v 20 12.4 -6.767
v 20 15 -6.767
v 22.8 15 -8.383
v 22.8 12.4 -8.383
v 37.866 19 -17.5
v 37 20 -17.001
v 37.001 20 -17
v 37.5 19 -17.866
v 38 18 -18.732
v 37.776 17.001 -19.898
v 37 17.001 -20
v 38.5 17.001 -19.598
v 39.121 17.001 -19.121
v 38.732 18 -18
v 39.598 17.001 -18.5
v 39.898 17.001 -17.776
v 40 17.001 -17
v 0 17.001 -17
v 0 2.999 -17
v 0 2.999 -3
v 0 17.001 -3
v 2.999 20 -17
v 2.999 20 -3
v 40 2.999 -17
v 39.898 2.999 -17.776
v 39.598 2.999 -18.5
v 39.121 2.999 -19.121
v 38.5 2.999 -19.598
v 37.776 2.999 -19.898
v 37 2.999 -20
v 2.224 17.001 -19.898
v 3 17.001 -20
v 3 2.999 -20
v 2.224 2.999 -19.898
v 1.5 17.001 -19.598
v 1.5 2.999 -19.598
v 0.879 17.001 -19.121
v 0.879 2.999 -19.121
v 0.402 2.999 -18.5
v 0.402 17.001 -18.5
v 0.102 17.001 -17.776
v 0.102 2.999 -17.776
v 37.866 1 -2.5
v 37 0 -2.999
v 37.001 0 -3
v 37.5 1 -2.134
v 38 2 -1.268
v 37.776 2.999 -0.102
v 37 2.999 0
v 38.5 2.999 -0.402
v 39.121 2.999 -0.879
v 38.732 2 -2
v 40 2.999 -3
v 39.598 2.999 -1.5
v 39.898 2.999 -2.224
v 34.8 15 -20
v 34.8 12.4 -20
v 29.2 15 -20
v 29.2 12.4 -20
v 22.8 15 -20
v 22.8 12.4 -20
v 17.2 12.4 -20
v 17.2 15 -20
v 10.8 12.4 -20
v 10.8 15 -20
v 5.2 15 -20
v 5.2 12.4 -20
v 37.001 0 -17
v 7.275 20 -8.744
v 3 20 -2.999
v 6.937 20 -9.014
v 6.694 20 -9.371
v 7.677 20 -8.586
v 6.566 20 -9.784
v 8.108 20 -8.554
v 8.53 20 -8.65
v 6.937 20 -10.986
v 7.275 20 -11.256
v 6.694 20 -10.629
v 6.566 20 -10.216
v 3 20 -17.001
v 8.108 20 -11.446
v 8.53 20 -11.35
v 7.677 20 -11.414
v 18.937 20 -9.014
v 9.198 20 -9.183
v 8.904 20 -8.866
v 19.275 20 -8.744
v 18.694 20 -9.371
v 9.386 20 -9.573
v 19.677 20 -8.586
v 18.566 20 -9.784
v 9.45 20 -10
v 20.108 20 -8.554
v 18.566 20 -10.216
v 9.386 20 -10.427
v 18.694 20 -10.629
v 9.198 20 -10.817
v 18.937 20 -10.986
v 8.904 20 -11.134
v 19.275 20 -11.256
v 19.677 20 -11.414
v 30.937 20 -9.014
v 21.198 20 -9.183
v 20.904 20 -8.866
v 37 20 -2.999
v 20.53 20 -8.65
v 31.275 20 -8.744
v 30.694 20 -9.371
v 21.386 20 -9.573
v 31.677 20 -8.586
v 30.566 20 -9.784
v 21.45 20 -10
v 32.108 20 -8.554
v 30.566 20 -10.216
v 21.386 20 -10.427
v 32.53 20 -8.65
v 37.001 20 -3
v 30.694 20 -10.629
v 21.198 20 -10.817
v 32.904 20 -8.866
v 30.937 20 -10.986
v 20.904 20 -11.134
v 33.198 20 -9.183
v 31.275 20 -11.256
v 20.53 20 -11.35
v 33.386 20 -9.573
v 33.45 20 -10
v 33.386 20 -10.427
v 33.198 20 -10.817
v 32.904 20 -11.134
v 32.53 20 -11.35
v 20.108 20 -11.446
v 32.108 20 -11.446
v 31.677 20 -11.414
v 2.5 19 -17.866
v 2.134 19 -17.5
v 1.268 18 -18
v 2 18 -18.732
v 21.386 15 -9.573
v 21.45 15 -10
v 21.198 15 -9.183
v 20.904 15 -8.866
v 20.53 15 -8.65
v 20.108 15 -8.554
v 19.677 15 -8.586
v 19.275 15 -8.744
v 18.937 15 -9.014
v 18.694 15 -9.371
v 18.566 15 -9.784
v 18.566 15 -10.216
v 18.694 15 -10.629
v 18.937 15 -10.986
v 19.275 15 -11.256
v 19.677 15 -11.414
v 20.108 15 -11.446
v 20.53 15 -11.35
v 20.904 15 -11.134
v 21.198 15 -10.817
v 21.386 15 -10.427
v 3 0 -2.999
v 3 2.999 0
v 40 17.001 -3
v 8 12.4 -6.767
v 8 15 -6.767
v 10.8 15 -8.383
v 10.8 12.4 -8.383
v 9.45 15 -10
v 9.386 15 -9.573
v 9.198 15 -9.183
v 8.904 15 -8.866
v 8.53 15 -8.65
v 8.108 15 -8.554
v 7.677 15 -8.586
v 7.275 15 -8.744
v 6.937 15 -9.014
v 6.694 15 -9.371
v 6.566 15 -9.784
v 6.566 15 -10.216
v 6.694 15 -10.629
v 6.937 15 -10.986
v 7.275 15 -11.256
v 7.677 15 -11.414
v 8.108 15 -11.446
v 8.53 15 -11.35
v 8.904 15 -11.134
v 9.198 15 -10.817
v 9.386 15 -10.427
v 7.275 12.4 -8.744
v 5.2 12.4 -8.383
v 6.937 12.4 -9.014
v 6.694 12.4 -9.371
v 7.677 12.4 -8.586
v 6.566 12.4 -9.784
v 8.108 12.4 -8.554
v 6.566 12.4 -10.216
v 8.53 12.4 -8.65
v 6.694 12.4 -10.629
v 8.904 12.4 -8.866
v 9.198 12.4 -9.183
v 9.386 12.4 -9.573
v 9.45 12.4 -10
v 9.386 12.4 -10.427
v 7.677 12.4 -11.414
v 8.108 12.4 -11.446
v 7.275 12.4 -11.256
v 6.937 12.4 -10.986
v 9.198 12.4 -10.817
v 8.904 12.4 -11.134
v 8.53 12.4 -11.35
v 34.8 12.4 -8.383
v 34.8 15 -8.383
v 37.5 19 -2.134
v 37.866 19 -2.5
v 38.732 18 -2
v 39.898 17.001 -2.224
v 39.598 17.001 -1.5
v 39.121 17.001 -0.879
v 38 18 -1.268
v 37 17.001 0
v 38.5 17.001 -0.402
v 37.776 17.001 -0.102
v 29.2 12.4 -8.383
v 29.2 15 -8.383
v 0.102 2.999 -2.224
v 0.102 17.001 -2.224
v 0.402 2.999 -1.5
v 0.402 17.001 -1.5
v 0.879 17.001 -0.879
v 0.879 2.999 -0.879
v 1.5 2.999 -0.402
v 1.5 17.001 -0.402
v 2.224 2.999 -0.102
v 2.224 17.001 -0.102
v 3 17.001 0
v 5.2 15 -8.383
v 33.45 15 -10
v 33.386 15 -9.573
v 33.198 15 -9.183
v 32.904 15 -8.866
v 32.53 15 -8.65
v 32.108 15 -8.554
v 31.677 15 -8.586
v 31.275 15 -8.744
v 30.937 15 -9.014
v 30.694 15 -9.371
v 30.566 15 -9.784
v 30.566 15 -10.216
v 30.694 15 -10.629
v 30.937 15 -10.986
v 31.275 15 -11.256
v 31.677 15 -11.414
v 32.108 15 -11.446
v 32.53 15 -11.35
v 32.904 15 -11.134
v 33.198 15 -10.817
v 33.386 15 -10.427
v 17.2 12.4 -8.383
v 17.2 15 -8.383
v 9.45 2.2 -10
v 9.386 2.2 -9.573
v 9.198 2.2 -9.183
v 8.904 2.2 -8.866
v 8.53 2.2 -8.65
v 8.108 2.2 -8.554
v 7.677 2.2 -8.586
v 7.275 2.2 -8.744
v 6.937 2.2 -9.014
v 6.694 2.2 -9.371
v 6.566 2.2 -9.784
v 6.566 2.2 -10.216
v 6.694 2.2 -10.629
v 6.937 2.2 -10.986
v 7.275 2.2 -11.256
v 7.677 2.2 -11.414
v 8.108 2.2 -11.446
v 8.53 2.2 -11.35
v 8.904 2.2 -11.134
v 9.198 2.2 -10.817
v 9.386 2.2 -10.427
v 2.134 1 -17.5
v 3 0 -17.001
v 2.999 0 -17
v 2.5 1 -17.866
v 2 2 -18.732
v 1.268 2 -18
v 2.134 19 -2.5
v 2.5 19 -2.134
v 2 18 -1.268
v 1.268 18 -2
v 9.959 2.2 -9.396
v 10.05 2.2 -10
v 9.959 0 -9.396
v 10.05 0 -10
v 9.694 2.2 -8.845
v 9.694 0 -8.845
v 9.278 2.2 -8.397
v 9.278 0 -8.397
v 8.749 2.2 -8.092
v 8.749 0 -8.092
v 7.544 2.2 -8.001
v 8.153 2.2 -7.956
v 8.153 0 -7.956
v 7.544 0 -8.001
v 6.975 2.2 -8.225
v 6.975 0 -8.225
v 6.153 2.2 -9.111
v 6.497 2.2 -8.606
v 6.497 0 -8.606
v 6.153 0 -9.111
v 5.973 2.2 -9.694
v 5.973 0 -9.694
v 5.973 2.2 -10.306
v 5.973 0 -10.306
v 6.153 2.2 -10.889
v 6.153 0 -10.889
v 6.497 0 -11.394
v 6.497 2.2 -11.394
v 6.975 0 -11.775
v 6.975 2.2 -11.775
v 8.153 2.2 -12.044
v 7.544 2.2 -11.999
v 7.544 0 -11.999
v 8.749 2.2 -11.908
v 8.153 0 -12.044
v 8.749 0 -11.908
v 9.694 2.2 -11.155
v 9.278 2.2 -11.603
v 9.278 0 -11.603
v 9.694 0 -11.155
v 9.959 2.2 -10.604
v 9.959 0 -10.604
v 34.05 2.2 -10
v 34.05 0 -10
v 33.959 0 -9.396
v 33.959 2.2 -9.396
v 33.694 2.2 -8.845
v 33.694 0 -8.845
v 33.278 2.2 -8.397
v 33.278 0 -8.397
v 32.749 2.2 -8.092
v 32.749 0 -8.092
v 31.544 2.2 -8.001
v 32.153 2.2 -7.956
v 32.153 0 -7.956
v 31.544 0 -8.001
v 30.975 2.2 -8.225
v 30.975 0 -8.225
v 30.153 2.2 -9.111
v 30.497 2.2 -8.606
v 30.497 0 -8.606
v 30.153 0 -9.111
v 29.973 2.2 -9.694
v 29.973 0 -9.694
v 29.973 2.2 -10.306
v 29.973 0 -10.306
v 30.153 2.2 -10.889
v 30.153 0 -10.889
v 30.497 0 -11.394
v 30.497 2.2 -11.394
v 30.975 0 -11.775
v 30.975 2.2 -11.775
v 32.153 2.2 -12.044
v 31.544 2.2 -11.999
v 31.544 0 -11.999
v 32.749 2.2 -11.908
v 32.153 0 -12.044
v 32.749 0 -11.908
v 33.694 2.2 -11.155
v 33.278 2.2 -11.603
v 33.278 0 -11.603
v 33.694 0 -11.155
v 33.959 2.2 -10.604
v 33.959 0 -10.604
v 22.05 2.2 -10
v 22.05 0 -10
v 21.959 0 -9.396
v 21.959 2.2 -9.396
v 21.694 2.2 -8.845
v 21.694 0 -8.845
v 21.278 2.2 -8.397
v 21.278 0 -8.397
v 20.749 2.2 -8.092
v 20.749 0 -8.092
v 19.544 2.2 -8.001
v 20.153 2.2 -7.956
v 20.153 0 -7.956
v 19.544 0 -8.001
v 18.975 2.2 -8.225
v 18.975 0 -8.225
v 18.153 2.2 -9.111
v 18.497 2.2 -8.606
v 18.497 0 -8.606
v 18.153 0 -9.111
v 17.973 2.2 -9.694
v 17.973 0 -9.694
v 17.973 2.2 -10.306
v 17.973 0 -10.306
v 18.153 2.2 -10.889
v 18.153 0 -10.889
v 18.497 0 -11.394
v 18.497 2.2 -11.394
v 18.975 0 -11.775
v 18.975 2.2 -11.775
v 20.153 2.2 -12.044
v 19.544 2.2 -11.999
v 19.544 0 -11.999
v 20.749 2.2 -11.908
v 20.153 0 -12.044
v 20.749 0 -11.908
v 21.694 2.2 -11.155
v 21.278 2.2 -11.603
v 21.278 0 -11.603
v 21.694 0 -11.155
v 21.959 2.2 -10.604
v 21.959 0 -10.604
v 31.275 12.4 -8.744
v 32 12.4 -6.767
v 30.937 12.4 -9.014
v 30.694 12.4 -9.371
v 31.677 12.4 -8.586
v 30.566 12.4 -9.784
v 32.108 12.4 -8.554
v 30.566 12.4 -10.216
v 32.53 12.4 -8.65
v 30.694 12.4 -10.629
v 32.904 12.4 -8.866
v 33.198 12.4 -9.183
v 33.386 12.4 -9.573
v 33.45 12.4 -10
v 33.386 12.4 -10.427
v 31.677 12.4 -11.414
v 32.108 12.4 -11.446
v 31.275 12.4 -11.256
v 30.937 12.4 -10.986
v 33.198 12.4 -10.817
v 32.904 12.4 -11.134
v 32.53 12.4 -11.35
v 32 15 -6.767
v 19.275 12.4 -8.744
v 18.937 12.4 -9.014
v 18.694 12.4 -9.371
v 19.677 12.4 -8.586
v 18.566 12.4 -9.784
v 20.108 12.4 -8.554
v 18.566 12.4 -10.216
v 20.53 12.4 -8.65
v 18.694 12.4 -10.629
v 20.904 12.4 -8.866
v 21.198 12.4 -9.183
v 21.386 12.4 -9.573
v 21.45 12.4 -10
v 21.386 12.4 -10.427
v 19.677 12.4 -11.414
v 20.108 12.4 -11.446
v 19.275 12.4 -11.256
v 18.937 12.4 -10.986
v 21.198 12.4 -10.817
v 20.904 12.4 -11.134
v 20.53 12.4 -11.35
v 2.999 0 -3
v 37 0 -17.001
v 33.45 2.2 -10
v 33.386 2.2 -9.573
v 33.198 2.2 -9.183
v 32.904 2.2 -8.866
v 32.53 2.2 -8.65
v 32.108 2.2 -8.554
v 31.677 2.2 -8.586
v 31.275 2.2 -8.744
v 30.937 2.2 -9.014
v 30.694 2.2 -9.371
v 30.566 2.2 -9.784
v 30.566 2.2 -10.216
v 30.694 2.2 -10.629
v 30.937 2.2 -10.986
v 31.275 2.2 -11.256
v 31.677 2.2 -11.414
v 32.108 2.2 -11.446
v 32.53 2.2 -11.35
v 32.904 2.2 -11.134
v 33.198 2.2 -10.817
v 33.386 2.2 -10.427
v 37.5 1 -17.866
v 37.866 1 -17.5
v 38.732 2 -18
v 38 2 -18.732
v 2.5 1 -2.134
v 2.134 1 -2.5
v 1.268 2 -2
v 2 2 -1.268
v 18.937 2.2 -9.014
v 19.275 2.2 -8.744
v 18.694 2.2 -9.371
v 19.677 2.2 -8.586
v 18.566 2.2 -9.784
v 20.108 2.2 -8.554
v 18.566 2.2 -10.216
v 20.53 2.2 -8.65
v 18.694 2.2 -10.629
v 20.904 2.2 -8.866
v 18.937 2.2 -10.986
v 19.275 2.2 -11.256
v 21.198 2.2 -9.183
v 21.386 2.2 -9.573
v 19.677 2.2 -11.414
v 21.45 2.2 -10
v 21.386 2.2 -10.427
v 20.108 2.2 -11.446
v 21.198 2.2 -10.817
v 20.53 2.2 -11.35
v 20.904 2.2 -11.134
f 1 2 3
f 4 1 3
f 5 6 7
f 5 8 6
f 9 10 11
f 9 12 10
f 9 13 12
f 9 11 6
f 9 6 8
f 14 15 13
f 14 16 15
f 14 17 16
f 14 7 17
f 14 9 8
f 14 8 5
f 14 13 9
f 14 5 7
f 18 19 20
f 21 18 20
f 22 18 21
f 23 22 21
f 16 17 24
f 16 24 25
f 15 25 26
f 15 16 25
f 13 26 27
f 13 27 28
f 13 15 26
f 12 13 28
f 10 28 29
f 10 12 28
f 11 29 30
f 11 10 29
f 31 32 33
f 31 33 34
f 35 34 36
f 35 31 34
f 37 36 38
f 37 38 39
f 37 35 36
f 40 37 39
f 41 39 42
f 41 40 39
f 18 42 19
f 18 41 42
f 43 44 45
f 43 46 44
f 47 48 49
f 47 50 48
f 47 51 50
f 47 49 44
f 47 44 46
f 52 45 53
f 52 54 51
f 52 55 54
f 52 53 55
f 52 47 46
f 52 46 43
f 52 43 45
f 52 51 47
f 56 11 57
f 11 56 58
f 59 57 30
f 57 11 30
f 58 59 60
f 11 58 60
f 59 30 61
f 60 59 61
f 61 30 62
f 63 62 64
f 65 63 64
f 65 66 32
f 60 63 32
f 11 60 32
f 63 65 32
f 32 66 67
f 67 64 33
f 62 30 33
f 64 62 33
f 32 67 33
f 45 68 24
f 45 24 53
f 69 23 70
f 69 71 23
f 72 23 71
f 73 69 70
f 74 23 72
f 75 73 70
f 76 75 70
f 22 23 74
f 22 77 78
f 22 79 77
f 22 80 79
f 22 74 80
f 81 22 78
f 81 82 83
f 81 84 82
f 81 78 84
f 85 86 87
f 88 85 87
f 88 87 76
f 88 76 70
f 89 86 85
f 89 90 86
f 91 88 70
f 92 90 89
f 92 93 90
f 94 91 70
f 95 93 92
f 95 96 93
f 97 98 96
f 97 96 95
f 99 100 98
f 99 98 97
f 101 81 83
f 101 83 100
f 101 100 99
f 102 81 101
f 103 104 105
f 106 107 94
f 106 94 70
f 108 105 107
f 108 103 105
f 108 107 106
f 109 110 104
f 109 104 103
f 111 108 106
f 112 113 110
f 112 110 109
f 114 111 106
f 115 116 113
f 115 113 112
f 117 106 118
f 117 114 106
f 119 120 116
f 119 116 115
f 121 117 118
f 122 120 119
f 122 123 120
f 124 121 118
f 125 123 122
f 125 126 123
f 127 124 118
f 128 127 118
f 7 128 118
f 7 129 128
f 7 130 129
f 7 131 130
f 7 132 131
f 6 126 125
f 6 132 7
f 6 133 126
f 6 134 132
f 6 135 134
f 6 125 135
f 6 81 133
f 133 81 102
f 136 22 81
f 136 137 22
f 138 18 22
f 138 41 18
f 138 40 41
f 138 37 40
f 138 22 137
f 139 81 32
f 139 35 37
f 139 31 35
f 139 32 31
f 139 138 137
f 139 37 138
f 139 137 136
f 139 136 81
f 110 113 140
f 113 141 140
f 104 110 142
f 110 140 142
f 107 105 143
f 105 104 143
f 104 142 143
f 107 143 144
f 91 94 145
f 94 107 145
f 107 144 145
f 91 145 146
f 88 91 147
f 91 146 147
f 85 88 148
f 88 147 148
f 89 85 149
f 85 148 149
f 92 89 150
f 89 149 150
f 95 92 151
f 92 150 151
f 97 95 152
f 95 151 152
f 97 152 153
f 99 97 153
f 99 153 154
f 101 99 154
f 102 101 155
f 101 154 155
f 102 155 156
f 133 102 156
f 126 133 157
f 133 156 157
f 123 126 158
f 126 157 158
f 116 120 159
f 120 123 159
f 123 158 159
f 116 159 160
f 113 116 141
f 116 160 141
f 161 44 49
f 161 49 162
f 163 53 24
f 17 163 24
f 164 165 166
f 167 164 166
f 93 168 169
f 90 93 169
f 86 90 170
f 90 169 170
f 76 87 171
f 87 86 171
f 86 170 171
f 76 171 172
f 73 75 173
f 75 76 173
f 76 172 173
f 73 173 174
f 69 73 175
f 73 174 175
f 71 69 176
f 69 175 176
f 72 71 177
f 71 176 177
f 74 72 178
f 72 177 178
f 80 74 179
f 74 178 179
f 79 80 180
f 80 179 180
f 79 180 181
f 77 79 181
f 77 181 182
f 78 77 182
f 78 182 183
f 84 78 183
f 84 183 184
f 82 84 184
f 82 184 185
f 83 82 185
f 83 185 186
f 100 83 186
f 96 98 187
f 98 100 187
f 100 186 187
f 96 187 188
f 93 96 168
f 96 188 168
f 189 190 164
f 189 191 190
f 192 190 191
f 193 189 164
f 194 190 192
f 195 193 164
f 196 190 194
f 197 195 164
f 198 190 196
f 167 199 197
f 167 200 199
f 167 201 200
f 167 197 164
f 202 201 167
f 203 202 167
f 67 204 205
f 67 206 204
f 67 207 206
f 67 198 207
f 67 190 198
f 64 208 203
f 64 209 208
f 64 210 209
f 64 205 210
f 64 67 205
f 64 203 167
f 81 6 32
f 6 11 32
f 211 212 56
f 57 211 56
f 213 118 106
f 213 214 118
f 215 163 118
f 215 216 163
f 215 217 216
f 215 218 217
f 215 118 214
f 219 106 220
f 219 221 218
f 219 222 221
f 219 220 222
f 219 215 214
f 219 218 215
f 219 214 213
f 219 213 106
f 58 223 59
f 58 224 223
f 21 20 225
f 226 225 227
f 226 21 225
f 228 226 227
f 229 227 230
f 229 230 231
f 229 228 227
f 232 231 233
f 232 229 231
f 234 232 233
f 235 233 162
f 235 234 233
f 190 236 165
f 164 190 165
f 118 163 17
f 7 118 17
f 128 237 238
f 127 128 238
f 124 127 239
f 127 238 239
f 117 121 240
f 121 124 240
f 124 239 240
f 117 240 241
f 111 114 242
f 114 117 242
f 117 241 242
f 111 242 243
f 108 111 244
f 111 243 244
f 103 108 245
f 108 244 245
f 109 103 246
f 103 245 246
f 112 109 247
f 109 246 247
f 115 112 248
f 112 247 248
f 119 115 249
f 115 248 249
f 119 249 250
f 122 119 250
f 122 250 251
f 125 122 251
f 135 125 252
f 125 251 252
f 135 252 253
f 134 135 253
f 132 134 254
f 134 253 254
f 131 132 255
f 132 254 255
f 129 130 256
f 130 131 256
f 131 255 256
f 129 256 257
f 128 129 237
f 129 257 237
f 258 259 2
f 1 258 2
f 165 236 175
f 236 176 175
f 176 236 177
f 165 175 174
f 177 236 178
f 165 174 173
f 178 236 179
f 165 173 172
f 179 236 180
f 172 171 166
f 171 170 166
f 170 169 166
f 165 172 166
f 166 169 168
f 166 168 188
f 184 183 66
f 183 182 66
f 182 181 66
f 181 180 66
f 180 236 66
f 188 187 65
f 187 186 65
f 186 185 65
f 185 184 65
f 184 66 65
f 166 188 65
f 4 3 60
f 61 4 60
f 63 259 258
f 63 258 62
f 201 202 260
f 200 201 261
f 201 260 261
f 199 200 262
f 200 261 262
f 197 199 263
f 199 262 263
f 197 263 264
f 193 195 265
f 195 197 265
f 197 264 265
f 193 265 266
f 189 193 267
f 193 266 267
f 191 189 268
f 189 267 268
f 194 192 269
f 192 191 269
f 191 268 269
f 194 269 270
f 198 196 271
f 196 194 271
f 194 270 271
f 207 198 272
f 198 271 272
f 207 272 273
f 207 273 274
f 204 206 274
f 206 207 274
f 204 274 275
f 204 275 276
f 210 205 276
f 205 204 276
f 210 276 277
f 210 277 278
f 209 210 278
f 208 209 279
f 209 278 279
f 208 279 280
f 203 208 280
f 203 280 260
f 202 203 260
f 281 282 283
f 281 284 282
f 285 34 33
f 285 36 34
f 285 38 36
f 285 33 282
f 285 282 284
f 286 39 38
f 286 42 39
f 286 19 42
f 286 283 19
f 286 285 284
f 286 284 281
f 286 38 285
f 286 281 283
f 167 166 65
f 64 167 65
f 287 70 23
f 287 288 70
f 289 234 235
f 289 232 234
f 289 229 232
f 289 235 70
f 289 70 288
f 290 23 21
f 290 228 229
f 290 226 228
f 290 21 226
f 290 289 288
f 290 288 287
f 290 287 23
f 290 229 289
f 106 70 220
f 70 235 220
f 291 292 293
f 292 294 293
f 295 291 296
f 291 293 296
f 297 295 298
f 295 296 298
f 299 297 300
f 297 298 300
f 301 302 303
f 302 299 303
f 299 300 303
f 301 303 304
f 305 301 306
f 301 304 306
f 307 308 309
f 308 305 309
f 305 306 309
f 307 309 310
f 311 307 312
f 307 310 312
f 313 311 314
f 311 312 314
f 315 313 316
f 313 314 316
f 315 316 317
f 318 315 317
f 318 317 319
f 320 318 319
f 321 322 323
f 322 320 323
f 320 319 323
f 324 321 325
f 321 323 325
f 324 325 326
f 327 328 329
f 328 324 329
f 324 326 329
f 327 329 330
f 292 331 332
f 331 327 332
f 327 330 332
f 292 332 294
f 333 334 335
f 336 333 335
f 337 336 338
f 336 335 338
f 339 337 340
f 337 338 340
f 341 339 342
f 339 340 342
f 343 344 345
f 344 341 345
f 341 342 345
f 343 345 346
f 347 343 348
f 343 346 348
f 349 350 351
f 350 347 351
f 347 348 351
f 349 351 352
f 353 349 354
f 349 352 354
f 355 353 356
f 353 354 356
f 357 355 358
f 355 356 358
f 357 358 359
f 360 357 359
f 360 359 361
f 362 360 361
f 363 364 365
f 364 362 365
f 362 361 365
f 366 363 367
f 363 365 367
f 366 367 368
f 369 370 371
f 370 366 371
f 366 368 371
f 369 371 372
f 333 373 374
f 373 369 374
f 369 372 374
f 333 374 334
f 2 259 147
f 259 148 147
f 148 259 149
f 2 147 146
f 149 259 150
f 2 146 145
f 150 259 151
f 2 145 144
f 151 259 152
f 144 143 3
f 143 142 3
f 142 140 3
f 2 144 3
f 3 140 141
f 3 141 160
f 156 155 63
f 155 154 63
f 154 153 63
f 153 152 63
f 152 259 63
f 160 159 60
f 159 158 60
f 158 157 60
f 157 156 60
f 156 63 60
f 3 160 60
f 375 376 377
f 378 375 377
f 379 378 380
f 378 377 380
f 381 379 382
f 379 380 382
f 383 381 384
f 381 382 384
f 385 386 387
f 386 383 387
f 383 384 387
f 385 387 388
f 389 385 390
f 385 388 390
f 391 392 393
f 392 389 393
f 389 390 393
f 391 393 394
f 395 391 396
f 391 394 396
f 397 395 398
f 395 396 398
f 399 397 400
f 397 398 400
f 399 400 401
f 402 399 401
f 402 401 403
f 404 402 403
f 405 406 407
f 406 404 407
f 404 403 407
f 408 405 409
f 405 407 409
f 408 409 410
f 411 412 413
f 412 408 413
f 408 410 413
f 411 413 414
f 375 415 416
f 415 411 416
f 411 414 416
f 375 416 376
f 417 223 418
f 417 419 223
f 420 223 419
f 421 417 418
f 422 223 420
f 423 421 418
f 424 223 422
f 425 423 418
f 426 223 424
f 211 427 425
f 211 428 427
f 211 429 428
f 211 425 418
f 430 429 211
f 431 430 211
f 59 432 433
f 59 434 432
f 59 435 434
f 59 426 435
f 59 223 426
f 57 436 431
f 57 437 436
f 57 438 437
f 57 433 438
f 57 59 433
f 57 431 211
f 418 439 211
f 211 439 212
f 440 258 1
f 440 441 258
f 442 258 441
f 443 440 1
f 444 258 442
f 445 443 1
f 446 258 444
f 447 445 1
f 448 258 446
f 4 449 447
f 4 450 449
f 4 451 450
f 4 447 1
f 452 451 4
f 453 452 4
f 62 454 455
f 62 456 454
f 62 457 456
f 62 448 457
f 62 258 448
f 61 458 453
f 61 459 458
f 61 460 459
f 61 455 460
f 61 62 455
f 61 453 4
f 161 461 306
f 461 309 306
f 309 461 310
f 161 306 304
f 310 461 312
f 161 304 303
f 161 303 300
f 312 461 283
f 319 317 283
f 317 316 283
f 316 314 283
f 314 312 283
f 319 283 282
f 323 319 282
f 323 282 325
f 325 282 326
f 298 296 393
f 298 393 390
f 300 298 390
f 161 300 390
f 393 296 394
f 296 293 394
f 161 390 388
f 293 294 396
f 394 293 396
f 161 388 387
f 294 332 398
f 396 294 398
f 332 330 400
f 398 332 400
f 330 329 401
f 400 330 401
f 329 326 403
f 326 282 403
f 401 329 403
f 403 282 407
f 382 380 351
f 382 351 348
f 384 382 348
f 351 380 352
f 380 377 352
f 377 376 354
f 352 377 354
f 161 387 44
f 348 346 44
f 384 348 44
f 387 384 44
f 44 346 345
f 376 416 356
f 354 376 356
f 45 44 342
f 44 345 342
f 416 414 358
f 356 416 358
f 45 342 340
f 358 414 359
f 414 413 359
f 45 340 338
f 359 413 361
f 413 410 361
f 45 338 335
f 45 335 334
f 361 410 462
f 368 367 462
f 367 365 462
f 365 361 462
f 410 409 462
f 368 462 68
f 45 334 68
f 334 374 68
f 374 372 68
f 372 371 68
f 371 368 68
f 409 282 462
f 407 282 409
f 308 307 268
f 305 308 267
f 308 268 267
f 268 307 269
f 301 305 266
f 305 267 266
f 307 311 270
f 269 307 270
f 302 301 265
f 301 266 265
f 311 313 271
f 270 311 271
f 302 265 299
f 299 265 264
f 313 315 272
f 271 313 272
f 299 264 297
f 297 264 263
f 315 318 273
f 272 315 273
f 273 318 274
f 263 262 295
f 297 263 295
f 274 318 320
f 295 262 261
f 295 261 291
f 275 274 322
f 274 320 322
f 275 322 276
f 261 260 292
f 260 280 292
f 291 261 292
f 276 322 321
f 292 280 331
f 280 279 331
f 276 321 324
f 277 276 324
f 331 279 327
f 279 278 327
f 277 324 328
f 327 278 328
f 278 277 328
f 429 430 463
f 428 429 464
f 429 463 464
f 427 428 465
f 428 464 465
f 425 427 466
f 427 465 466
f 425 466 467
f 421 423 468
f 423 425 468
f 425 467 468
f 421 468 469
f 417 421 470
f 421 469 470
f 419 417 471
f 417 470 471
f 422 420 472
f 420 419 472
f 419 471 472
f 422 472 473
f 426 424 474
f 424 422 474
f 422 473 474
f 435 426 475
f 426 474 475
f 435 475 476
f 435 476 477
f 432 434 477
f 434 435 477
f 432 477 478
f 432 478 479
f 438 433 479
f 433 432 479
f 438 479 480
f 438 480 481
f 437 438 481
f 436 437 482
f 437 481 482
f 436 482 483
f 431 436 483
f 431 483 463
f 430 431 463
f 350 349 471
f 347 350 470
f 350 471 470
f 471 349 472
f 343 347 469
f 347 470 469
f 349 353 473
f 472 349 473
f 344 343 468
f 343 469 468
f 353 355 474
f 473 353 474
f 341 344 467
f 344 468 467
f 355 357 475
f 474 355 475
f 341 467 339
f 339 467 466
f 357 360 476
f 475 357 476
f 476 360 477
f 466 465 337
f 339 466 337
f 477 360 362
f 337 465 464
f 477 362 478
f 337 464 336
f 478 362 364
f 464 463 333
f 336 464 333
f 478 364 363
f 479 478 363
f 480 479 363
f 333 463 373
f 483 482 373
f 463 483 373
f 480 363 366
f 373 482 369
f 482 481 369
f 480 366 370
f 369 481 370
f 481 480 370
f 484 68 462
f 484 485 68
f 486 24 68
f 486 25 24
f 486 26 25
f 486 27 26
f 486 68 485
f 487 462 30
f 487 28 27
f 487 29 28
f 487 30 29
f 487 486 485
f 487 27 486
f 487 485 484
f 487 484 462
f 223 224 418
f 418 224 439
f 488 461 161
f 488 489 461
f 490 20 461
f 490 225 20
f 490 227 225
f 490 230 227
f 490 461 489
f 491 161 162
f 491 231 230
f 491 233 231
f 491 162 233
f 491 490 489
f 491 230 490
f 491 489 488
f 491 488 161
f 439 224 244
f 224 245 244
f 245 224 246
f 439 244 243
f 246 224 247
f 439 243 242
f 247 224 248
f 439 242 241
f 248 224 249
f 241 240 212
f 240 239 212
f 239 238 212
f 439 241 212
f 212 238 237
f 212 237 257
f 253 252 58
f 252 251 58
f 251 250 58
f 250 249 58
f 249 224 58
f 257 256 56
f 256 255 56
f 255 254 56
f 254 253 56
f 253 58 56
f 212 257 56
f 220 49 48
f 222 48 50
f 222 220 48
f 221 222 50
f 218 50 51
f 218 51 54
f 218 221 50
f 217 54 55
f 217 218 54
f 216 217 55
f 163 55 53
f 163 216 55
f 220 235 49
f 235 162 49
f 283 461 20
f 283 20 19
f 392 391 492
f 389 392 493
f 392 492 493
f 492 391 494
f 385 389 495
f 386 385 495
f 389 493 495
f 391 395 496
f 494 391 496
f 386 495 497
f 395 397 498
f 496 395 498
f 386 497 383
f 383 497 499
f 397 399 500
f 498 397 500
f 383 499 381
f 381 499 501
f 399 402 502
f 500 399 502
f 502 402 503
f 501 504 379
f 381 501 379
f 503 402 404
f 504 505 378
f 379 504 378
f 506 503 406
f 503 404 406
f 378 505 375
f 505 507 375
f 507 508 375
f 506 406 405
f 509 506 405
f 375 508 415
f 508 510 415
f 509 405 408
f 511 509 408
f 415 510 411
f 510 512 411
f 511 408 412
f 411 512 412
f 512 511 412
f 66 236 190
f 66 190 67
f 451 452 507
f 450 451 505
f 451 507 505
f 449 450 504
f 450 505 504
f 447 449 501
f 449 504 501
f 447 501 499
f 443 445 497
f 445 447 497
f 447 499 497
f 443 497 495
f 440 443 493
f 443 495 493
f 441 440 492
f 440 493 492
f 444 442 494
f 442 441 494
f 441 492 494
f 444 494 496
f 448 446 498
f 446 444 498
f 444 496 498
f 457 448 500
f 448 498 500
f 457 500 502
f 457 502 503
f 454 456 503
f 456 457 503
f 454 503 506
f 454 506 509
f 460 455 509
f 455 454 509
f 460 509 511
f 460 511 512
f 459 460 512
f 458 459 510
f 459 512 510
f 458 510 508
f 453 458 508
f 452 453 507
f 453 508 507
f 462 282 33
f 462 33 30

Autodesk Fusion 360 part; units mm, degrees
sketch "Sketch1" plane through (0, 0, 0) normal (0, 1, 0) x (1, 0, 0)
  line L0 (0, 0) -> (40, 0)
  line L1 (40, 0) -> (40, 20)
  line L2 (40, 20) -> (0, 20)
  line L3 (0, 20) -> (0, 0)
  circle A0 centre (8, 10) radius 2.05
  circle A1 centre (20, 10) radius 2.05
  circle A2 centre (32, 10) radius 2.05
  circle A3 centre (8, 10) radius 2.8 construction
  circle A4 centre (32, 10) radius 2.8 construction
  line L4 (5.2, 8.3834) -> (8, 6.7668)
  line L5 (8, 6.7668) -> (10.8, 8.3834)
  line L6 (10.8, 8.3834) -> (10.8, 11.6166)
  line L7 (10.8, 11.6166) -> (8, 13.2332) construction
  line L8 (8, 13.2332) -> (5.2, 11.6166) construction
  line L9 (5.2, 11.6166) -> (5.2, 8.3834)
  line L10 (29.2, 8.3834) -> (32, 6.7668)
  line L11 (32, 6.7668) -> (34.8, 8.3834)
  line L12 (34.8, 8.3834) -> (34.8, 11.6166)
  line L13 (34.8, 11.6166) -> (32, 13.2332) construction
  line L14 (32, 13.2332) -> (29.2, 11.6166) construction
  line L15 (29.2, 11.6166) -> (29.2, 8.3834)
  line L16 (10.8, 11.6166) -> (10.8, 20)
  line L17 (5.2, 11.6166) -> (5.2, 20)
  line L18 (34.8, 11.6166) -> (34.8, 20)
  line L19 (29.2, 11.6166) -> (29.2, 20)
  circle A5 centre (20, 10) radius 1.45
  circle A6 centre (32, 10) radius 1.45
  circle A7 centre (8, 10) radius 1.45
  line L20 (17.2, 8.3834) -> (20, 6.7668)
  line L21 (20, 6.7668) -> (22.8, 8.3834)
  line L22 (22.8, 8.3834) -> (22.8, 11.6166)
  line L23 (22.8, 11.6166) -> (20, 13.2332) construction
  line L24 (20, 13.2332) -> (17.2, 11.6166) construction
  line L25 (17.2, 11.6166) -> (17.2, 8.3834)
  line L26 (17.2, 11.6166) -> (17.2, 20)
  line L27 (22.8, 11.6166) -> (22.8, 20)
  point P0 (8, 10)
  point P1 (32, 10)
  point P2 (20, 10)
  dimension "ClampWidth" = 20
  dimension "ClampLength" = 40
  dimension "MagnetHoleDia" = 4.1
  dimension "d7" = 10
  dimension "d11" = 8
  dimension "d14" = 24
  dimension "d15" = 0
  dimension "NutCircum" = 5.6
  dimension "d17" = 10
  dimension "d19" = 5.6
  dimension "d20" = 8
  dimension "d21" = 10
  dimension "d22" = 2.9
  dimension "ScrewDia" = 2.9
  dimension "d24" = 2.9
extrude "Extrude1" add sketch "Sketch1" along normal blind 20 contours L0 L1 L2 L3 L4 L5 L6 L9 L10 L11 L12 L15 L16 L17 L18 L19 L20 L21 L22 L25 L26 L27 | L2 L4 L5 L6 L9 L16 L17 | L2 L10 L11 L12 L15 L18 L19 | L2 L20 L21 L22 L25 L26 L27 | A0 | A1 | A2 | A5 | A6 | A7
extrude "Extrude2" cut sketch "Sketch1" along normal blind 2.2 contours A0 | A1 | A2 | A5 | A6 | A7
extrude "Extrude3" cut sketch "Sketch1" along normal blind 20 contours A5 | A6 | A7
extrude "Extrude4" cut sketch "Sketch1" against normal blind 2.6 from surface at 15 contours L2 L4 L5 L6 L9 L16 L17 | L2 L10 L11 L12 L15 L18 L19 | L2 L20 L21 L22 L25 L26 L27 | A0 | A1 | A2
fillet "Fillet1" radius 3 4 edges at (40, 10, -20) (40, 10, 0) (0, 10, 0) (0, 10, -20)
chamfer "Chamfer1" distance 3 angle 45 8 edges at (20, 20, -20) (40, 20, -10) (20, 20, 0) (0, 20, -10) (0, 0, -10) (20, 0, -20) (20, 0, 0) (40, 0, -10)
equation "d7 = ClampWidth / 2"
equation "d11 = ClampLength / 5"
equation "d14 = ClampLength * 3 / 5"
equation "d17 = ClampWidth / 2"
equation "d19 = NutCircum"
equation "d20 = ClampLength / 5"
equation "d21 = ClampWidth / 2"
equation "d22 = ScrewDia"
equation "d24 = ScrewDia"
equation "TotalHeight = 20 mm"
equation "d29 = TotalHeight"
equation "NutTopOffset = 5 mm"
equation "NutWidth = 2.6 mm"
equation "d33 = TotalHeight - NutTopOffset"
equation "d34 = -NutWidth"
